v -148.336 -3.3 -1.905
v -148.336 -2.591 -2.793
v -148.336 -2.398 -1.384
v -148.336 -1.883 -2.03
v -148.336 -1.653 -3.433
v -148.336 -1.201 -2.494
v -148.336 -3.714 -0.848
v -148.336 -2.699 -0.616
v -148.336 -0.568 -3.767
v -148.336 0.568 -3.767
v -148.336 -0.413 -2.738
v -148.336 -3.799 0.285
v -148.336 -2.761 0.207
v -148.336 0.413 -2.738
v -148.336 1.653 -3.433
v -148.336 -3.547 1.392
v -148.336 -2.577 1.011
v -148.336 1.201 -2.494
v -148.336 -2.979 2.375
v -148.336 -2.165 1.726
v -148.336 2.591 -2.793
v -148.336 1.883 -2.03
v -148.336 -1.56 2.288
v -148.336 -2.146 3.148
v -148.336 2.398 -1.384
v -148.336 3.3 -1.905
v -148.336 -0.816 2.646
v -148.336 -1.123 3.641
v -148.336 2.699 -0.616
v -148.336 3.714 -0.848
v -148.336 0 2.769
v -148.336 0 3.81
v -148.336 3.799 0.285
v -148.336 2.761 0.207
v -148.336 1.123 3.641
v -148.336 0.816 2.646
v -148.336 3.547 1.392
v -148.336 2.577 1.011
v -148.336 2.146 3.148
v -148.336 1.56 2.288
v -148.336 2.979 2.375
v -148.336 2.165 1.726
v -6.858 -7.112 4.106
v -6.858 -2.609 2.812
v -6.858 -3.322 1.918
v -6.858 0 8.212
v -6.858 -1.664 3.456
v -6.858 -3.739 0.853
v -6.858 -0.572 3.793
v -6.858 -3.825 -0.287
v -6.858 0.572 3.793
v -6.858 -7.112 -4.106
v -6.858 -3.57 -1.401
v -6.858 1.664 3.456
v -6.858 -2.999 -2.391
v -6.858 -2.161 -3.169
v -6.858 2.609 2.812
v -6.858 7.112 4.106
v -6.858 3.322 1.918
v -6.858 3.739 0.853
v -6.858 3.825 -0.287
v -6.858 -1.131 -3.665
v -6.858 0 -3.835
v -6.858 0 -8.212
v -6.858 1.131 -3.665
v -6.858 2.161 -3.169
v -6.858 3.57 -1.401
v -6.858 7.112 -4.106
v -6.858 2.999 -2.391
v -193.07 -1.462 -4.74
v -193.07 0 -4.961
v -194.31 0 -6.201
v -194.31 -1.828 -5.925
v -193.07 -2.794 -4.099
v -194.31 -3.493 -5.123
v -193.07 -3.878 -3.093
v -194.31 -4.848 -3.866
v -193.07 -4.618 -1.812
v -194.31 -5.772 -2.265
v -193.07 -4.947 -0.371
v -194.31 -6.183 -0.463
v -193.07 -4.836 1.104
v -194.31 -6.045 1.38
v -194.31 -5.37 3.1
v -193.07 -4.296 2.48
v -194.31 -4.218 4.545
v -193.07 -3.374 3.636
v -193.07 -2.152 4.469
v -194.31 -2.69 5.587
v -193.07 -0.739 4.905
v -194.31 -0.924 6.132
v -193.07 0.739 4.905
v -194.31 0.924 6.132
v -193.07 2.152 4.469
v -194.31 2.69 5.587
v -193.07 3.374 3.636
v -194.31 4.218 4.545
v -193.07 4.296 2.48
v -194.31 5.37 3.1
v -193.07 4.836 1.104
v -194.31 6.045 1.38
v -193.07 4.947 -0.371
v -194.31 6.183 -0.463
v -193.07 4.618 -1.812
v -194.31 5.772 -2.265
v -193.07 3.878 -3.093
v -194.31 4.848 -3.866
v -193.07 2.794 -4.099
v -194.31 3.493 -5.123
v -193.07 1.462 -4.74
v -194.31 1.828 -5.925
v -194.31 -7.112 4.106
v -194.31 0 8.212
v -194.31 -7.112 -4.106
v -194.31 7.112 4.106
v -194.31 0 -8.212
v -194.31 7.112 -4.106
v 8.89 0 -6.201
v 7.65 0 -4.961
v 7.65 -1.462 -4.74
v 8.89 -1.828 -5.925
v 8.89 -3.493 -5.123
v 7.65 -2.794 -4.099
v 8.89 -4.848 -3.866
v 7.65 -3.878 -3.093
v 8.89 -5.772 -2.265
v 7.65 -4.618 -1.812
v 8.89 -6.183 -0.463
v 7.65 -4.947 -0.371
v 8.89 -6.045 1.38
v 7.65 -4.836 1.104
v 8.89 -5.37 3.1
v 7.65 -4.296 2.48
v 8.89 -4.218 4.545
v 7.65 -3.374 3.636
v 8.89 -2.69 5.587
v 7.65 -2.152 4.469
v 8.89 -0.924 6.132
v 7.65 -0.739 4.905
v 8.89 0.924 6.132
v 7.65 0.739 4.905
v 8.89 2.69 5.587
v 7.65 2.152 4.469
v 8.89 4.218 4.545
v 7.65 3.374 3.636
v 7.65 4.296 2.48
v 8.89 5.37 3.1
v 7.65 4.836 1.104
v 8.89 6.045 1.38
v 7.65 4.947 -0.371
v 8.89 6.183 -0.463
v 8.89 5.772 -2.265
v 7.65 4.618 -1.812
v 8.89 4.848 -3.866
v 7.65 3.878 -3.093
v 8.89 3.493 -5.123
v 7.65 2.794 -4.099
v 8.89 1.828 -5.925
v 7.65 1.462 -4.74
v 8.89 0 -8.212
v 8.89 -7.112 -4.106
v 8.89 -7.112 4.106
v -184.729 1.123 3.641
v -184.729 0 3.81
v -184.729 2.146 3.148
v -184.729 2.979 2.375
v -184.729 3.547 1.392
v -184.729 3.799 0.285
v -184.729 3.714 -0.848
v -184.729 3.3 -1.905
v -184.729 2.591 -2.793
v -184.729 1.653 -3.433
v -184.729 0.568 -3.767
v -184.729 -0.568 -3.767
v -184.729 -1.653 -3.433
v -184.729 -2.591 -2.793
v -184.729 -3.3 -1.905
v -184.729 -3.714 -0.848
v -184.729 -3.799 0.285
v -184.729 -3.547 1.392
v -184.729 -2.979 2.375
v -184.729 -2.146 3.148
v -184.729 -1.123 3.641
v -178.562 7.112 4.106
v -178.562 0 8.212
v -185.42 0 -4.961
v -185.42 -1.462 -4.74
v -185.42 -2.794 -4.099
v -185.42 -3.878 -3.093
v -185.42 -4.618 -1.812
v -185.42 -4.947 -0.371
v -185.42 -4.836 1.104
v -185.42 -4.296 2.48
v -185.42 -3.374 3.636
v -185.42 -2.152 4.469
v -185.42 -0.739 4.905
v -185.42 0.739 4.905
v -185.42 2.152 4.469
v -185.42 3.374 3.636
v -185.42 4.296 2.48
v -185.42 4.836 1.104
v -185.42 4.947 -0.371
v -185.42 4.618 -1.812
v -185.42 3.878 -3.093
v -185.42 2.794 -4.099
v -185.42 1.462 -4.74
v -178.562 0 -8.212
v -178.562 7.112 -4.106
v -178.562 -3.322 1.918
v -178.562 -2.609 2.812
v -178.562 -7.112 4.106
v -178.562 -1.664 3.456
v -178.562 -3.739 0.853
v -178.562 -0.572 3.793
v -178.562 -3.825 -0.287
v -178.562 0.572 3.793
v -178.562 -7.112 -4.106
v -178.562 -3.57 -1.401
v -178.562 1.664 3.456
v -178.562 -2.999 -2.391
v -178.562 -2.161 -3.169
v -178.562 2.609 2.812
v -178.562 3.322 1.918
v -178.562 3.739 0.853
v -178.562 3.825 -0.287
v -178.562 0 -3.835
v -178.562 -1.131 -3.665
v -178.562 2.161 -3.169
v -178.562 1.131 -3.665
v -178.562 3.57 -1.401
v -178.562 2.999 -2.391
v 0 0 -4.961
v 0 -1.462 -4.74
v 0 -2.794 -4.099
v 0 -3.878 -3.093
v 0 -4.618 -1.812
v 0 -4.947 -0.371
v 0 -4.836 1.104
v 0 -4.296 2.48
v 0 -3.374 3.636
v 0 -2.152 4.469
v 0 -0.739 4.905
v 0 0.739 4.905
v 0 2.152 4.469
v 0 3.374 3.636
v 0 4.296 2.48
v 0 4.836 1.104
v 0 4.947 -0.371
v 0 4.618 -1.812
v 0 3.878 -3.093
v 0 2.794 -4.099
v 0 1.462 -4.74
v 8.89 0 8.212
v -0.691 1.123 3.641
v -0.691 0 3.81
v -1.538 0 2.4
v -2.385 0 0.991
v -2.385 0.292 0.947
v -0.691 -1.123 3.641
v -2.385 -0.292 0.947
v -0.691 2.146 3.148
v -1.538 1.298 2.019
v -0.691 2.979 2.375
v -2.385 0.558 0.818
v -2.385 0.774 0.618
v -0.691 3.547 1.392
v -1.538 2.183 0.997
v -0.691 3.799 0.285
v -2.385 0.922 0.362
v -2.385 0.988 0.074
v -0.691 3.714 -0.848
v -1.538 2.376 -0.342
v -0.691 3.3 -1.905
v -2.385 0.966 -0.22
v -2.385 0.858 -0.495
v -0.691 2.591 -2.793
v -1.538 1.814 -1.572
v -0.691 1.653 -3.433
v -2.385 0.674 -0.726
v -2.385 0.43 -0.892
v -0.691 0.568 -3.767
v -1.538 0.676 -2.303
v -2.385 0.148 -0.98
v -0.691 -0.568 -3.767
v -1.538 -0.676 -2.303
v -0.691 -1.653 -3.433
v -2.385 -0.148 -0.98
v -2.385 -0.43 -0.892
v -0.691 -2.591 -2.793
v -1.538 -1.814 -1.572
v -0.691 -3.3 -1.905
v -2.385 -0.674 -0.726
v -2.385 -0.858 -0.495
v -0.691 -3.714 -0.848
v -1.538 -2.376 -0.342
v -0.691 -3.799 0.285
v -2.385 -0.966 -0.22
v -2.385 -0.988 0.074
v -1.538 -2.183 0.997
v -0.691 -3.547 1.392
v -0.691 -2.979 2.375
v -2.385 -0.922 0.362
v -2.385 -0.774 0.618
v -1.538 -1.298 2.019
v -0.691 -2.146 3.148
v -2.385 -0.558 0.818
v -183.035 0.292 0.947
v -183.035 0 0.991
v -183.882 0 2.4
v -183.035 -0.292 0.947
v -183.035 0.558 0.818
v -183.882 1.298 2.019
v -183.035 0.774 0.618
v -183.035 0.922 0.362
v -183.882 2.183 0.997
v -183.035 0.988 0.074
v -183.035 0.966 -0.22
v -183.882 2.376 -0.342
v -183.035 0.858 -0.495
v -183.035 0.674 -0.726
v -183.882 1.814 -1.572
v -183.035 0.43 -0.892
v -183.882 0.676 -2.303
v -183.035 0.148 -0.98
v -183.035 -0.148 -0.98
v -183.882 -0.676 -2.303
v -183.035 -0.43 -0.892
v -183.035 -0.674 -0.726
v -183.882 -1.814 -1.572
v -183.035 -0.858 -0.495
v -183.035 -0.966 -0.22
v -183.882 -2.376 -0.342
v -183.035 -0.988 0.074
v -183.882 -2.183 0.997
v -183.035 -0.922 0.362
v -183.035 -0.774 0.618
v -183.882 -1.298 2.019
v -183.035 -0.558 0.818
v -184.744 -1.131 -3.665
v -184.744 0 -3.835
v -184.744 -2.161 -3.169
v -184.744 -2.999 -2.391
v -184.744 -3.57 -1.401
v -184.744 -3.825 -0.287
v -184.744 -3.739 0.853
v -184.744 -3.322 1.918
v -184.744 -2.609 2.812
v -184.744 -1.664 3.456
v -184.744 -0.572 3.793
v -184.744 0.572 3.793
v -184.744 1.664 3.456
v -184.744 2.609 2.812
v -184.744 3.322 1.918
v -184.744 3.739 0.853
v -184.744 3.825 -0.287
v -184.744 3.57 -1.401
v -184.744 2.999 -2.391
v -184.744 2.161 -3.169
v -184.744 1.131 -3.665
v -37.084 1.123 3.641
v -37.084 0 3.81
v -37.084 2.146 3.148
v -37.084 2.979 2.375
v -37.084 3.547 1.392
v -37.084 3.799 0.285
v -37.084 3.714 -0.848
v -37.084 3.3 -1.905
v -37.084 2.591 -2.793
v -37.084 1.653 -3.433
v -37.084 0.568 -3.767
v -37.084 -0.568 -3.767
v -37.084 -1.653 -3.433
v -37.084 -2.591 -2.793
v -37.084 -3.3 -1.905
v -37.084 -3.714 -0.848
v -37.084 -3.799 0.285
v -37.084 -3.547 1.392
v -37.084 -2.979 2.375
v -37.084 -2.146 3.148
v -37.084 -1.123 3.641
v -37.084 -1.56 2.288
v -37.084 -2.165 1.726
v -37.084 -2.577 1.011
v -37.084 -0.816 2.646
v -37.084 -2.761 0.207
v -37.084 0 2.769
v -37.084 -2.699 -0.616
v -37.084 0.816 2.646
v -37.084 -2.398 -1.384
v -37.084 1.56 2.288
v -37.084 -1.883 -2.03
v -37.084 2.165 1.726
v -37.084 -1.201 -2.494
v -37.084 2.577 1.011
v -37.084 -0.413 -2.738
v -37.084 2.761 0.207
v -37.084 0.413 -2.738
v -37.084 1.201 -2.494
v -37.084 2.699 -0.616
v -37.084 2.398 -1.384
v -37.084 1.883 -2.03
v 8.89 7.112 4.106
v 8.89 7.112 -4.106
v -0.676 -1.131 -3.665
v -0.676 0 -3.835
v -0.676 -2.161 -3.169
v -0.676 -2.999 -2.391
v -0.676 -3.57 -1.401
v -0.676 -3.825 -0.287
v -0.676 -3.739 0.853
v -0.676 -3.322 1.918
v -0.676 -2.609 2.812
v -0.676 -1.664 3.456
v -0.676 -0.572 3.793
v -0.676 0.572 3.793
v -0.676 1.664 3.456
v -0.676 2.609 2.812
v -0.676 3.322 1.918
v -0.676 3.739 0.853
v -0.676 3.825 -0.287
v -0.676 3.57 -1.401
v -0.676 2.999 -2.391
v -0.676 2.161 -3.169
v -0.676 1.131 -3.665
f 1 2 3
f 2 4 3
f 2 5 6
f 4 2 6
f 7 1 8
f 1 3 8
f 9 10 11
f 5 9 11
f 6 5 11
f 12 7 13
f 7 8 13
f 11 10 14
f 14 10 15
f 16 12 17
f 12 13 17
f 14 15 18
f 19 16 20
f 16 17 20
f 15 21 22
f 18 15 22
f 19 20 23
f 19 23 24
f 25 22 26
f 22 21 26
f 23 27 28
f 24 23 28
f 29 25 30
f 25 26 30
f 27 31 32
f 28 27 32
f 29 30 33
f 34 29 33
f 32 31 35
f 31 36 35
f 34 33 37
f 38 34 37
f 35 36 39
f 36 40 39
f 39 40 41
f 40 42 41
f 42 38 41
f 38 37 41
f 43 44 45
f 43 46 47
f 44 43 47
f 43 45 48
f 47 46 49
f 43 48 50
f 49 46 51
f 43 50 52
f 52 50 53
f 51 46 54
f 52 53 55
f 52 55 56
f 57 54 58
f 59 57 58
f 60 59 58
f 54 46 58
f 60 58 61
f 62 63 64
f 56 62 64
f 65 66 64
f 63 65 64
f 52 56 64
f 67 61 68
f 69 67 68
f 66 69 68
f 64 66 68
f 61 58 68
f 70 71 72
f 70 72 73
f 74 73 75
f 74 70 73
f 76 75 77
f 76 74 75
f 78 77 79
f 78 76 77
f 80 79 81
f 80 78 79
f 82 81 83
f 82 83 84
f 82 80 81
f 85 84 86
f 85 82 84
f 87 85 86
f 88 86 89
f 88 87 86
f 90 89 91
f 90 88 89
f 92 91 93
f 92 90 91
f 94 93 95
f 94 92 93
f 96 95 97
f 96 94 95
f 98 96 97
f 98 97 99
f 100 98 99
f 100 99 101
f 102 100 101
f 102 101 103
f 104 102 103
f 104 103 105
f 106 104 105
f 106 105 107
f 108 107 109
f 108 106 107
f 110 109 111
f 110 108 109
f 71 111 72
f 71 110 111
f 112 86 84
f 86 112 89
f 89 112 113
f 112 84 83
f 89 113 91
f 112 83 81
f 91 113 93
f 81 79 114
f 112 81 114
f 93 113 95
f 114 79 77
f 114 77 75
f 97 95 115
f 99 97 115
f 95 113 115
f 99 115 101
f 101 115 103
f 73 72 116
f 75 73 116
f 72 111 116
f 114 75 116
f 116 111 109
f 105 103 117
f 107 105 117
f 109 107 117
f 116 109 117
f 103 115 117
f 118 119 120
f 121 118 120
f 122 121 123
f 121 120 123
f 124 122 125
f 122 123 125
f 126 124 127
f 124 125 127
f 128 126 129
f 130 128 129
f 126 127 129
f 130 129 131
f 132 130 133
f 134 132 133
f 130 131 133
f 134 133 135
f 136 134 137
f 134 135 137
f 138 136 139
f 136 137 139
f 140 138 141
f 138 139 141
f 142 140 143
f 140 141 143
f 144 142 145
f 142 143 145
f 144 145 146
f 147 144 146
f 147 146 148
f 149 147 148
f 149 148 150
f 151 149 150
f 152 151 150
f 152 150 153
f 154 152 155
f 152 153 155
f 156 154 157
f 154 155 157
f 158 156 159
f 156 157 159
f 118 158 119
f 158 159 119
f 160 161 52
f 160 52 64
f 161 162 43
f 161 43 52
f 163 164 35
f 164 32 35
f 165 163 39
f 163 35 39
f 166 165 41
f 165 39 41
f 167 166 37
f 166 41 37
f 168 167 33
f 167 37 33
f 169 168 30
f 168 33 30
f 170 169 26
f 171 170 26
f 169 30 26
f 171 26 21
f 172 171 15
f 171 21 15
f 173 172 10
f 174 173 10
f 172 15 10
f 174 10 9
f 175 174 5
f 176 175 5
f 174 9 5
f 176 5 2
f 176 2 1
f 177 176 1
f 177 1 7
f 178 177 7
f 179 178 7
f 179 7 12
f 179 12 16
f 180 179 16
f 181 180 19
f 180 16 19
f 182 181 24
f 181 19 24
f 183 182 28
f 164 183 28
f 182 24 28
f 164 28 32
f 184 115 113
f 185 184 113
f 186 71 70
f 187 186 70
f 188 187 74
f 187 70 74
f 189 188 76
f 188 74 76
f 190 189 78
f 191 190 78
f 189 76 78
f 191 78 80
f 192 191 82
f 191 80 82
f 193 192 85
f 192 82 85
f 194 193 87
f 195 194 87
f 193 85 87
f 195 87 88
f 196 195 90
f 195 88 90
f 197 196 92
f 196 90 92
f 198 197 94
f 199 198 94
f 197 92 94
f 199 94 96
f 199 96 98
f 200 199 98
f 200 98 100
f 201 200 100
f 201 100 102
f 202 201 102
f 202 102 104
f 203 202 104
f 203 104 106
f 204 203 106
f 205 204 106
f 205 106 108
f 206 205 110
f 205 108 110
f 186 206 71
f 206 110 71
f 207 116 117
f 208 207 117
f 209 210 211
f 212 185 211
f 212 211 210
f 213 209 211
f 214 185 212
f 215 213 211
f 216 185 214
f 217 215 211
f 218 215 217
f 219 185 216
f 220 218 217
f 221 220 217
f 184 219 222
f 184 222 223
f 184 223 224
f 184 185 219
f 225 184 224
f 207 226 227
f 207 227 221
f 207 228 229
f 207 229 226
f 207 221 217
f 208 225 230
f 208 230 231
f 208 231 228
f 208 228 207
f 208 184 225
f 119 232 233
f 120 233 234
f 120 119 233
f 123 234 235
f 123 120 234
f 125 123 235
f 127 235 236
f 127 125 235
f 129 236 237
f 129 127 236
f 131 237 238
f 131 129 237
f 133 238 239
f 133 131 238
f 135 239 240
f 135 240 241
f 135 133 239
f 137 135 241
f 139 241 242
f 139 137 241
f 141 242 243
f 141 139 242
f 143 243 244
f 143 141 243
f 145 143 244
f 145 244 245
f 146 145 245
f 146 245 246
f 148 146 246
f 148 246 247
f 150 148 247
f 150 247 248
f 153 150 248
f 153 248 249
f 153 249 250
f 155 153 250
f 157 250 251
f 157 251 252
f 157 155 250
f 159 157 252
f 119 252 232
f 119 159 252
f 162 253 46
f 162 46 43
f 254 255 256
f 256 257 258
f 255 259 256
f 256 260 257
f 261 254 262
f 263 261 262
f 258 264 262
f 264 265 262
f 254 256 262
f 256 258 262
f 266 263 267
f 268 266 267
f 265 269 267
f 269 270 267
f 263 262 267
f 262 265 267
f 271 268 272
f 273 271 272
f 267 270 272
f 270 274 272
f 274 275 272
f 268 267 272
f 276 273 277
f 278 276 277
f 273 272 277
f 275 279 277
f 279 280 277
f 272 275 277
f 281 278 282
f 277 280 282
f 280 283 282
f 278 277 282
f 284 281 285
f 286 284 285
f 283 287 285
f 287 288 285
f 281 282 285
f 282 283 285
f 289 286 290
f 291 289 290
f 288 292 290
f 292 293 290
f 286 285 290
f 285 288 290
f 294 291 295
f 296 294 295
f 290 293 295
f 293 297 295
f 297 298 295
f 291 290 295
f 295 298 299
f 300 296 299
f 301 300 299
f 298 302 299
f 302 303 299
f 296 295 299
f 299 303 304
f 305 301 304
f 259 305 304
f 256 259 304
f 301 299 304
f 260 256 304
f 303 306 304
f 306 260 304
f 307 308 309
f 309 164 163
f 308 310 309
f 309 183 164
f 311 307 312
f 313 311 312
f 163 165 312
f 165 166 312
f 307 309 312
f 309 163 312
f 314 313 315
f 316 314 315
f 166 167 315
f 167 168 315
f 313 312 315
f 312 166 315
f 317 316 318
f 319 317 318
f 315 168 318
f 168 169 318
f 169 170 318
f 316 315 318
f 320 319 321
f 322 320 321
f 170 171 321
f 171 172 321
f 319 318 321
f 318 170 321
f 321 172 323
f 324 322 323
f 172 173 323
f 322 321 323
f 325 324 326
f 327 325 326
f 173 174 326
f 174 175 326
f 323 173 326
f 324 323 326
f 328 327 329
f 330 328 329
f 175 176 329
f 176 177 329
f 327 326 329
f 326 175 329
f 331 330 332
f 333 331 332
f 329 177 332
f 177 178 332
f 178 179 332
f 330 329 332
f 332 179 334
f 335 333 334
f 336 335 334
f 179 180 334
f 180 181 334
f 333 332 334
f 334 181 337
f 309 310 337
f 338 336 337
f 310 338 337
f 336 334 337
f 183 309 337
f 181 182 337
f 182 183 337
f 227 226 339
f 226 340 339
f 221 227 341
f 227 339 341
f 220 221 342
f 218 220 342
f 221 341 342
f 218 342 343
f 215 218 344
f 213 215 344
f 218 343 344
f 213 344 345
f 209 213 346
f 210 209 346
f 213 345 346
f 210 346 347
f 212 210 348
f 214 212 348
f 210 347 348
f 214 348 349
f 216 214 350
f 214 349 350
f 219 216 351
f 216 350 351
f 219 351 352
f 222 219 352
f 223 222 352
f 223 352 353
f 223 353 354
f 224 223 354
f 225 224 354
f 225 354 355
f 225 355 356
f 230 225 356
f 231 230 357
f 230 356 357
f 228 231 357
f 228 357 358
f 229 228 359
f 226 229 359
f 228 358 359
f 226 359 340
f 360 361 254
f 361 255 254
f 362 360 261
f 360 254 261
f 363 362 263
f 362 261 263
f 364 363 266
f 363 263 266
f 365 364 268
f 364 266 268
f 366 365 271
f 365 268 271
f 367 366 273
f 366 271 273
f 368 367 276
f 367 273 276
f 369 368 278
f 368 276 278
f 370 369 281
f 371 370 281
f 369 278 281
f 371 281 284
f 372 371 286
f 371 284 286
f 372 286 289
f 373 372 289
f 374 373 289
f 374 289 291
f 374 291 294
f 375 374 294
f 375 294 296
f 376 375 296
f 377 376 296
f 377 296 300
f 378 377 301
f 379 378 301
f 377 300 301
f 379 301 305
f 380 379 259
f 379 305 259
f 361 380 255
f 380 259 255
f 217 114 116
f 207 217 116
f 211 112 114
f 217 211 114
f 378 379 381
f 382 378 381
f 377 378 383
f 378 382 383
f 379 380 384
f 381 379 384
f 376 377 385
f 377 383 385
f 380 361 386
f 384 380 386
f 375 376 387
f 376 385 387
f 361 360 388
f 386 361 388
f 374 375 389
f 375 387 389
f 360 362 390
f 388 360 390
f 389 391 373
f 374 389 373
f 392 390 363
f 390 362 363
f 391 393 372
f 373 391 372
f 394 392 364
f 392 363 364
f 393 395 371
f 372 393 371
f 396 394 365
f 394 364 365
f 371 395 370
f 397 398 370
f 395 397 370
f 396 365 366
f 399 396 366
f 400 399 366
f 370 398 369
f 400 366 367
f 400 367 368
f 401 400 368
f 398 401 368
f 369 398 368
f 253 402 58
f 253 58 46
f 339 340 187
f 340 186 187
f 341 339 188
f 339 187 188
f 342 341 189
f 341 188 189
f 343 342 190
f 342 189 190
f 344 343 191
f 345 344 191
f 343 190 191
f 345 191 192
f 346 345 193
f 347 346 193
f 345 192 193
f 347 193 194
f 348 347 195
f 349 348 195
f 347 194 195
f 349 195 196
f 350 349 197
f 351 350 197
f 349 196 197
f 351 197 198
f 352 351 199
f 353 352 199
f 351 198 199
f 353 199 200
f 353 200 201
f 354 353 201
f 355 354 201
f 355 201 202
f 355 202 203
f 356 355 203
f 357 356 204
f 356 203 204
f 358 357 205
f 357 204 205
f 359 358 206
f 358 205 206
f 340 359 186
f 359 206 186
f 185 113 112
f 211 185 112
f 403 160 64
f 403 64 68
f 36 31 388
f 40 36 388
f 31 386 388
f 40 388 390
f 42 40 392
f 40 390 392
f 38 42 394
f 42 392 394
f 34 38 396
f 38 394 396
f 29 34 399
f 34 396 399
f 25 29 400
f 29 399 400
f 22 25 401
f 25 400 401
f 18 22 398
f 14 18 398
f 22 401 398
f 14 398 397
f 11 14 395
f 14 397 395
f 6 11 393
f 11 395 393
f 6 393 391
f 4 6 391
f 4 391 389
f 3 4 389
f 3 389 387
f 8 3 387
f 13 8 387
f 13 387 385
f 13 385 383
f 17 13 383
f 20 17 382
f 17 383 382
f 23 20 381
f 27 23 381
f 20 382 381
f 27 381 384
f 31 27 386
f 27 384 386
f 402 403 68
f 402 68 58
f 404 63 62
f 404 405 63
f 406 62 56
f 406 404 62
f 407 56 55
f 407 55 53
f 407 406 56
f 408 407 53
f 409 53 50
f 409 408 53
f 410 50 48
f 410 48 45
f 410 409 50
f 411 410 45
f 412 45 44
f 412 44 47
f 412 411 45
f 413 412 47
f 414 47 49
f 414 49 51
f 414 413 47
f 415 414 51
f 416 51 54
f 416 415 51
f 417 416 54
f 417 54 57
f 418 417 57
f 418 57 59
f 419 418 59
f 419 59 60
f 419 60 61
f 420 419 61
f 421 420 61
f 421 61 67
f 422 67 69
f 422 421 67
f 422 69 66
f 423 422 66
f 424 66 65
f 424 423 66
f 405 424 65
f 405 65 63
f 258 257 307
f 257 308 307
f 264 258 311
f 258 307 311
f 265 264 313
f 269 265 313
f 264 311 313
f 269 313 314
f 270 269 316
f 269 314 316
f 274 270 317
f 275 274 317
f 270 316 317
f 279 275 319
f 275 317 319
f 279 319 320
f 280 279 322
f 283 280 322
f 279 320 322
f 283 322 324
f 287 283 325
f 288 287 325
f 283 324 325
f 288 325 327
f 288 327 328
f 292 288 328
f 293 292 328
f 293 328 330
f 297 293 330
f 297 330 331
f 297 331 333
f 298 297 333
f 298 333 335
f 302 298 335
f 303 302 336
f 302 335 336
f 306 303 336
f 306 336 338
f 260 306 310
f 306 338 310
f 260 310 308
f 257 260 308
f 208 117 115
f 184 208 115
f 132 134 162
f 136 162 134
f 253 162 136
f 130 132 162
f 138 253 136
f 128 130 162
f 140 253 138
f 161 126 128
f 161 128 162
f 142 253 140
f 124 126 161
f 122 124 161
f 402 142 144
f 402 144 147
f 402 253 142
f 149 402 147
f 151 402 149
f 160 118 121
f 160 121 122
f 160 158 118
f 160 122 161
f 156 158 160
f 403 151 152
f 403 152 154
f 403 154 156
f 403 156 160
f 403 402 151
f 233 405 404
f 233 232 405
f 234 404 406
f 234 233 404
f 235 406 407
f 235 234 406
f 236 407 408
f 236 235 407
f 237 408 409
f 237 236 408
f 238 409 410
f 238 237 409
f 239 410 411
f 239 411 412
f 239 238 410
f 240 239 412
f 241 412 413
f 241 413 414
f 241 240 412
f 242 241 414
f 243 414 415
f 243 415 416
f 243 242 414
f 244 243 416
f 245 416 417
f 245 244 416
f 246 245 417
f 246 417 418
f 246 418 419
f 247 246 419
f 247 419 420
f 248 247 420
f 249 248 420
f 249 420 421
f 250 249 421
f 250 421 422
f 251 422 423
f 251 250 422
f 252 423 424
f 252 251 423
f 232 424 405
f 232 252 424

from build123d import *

# Parameters (mm, degrees)
EXTRUDE2_DEPTH = 15.748
CHAMFER2_SIZE  = 1.240155


with BuildPart() as part:
    # Sketch5 → Extrude2 (new body)
    with BuildSketch(Plane(origin=(-6.858, 0, 0), x_dir=(0, 0, -1), z_dir=(1, 0, 0))):
        Polygon((4.106115114, 7.112), (-4.106115114, 7.112), (-8.212230229, 0), (-4.106115114, -7.112), (4.106115114, -7.112), (8.212230229, 0), align=None)
    extrude(amount=EXTRUDE2_DEPTH)

    # Sketch6 → Hole2 (revolve, cut)
    with BuildSketch(Plane(origin=(8.89, 0, 0), x_dir=(0, 0, -1), z_dir=(0, 1, 0))):
        Polygon((0, 0), (0, 15.748), (3.8354, 15.748), (3.8354, 9.566100386), (4.96062, 8.89), (4.96062, 0), align=None)
    revolve(axis=Axis((15.020023899, 0, 0), (-1, 0, 0)), mode=Mode.SUBTRACT)

    # Chamfer2
    chamfer2_edges = [part.edges().sort_by_distance(p)[0] for p in [
        (8.89, 0, 4.96062),
    ]]
    chamfer(chamfer2_edges, length=CHAMFER2_SIZE)


with BuildPart() as body_2:
    # Sketch8 → Revolve2 (revolve)
    with BuildSketch(Plane(origin=(0, 0, 0), x_dir=(-1, 0, 0), z_dir=(0, 0, -1)), mode=Mode.PRIVATE) as revolve2_sk:
        Polygon((0.691362245, 3.81), (2.385428675, 0.9906), (183.034571325, 0.9906), (184.728637755, 3.81), (148.336, 3.81), (148.336, 2.7686), (37.084, 2.7686), (37.084, 3.81), align=None)
    revolve(revolve2_sk.sketch.rotate(Axis((-0.691362245, 0, 0), (-1, 0, 0)), 270), axis=Axis((-0.691362245, 0, 0), (-1, 0, 0)))  # turned: the seam where the file's is


with BuildPart() as body_3:
    # Mirror2: mirrored copy
    add(part.part.mirror(Plane(origin=(-92.71, 0, 0), x_dir=(0, 0, 1), z_dir=(1, 0, 0))))


solid = Compound([part.part, body_2.part, body_3.part])
